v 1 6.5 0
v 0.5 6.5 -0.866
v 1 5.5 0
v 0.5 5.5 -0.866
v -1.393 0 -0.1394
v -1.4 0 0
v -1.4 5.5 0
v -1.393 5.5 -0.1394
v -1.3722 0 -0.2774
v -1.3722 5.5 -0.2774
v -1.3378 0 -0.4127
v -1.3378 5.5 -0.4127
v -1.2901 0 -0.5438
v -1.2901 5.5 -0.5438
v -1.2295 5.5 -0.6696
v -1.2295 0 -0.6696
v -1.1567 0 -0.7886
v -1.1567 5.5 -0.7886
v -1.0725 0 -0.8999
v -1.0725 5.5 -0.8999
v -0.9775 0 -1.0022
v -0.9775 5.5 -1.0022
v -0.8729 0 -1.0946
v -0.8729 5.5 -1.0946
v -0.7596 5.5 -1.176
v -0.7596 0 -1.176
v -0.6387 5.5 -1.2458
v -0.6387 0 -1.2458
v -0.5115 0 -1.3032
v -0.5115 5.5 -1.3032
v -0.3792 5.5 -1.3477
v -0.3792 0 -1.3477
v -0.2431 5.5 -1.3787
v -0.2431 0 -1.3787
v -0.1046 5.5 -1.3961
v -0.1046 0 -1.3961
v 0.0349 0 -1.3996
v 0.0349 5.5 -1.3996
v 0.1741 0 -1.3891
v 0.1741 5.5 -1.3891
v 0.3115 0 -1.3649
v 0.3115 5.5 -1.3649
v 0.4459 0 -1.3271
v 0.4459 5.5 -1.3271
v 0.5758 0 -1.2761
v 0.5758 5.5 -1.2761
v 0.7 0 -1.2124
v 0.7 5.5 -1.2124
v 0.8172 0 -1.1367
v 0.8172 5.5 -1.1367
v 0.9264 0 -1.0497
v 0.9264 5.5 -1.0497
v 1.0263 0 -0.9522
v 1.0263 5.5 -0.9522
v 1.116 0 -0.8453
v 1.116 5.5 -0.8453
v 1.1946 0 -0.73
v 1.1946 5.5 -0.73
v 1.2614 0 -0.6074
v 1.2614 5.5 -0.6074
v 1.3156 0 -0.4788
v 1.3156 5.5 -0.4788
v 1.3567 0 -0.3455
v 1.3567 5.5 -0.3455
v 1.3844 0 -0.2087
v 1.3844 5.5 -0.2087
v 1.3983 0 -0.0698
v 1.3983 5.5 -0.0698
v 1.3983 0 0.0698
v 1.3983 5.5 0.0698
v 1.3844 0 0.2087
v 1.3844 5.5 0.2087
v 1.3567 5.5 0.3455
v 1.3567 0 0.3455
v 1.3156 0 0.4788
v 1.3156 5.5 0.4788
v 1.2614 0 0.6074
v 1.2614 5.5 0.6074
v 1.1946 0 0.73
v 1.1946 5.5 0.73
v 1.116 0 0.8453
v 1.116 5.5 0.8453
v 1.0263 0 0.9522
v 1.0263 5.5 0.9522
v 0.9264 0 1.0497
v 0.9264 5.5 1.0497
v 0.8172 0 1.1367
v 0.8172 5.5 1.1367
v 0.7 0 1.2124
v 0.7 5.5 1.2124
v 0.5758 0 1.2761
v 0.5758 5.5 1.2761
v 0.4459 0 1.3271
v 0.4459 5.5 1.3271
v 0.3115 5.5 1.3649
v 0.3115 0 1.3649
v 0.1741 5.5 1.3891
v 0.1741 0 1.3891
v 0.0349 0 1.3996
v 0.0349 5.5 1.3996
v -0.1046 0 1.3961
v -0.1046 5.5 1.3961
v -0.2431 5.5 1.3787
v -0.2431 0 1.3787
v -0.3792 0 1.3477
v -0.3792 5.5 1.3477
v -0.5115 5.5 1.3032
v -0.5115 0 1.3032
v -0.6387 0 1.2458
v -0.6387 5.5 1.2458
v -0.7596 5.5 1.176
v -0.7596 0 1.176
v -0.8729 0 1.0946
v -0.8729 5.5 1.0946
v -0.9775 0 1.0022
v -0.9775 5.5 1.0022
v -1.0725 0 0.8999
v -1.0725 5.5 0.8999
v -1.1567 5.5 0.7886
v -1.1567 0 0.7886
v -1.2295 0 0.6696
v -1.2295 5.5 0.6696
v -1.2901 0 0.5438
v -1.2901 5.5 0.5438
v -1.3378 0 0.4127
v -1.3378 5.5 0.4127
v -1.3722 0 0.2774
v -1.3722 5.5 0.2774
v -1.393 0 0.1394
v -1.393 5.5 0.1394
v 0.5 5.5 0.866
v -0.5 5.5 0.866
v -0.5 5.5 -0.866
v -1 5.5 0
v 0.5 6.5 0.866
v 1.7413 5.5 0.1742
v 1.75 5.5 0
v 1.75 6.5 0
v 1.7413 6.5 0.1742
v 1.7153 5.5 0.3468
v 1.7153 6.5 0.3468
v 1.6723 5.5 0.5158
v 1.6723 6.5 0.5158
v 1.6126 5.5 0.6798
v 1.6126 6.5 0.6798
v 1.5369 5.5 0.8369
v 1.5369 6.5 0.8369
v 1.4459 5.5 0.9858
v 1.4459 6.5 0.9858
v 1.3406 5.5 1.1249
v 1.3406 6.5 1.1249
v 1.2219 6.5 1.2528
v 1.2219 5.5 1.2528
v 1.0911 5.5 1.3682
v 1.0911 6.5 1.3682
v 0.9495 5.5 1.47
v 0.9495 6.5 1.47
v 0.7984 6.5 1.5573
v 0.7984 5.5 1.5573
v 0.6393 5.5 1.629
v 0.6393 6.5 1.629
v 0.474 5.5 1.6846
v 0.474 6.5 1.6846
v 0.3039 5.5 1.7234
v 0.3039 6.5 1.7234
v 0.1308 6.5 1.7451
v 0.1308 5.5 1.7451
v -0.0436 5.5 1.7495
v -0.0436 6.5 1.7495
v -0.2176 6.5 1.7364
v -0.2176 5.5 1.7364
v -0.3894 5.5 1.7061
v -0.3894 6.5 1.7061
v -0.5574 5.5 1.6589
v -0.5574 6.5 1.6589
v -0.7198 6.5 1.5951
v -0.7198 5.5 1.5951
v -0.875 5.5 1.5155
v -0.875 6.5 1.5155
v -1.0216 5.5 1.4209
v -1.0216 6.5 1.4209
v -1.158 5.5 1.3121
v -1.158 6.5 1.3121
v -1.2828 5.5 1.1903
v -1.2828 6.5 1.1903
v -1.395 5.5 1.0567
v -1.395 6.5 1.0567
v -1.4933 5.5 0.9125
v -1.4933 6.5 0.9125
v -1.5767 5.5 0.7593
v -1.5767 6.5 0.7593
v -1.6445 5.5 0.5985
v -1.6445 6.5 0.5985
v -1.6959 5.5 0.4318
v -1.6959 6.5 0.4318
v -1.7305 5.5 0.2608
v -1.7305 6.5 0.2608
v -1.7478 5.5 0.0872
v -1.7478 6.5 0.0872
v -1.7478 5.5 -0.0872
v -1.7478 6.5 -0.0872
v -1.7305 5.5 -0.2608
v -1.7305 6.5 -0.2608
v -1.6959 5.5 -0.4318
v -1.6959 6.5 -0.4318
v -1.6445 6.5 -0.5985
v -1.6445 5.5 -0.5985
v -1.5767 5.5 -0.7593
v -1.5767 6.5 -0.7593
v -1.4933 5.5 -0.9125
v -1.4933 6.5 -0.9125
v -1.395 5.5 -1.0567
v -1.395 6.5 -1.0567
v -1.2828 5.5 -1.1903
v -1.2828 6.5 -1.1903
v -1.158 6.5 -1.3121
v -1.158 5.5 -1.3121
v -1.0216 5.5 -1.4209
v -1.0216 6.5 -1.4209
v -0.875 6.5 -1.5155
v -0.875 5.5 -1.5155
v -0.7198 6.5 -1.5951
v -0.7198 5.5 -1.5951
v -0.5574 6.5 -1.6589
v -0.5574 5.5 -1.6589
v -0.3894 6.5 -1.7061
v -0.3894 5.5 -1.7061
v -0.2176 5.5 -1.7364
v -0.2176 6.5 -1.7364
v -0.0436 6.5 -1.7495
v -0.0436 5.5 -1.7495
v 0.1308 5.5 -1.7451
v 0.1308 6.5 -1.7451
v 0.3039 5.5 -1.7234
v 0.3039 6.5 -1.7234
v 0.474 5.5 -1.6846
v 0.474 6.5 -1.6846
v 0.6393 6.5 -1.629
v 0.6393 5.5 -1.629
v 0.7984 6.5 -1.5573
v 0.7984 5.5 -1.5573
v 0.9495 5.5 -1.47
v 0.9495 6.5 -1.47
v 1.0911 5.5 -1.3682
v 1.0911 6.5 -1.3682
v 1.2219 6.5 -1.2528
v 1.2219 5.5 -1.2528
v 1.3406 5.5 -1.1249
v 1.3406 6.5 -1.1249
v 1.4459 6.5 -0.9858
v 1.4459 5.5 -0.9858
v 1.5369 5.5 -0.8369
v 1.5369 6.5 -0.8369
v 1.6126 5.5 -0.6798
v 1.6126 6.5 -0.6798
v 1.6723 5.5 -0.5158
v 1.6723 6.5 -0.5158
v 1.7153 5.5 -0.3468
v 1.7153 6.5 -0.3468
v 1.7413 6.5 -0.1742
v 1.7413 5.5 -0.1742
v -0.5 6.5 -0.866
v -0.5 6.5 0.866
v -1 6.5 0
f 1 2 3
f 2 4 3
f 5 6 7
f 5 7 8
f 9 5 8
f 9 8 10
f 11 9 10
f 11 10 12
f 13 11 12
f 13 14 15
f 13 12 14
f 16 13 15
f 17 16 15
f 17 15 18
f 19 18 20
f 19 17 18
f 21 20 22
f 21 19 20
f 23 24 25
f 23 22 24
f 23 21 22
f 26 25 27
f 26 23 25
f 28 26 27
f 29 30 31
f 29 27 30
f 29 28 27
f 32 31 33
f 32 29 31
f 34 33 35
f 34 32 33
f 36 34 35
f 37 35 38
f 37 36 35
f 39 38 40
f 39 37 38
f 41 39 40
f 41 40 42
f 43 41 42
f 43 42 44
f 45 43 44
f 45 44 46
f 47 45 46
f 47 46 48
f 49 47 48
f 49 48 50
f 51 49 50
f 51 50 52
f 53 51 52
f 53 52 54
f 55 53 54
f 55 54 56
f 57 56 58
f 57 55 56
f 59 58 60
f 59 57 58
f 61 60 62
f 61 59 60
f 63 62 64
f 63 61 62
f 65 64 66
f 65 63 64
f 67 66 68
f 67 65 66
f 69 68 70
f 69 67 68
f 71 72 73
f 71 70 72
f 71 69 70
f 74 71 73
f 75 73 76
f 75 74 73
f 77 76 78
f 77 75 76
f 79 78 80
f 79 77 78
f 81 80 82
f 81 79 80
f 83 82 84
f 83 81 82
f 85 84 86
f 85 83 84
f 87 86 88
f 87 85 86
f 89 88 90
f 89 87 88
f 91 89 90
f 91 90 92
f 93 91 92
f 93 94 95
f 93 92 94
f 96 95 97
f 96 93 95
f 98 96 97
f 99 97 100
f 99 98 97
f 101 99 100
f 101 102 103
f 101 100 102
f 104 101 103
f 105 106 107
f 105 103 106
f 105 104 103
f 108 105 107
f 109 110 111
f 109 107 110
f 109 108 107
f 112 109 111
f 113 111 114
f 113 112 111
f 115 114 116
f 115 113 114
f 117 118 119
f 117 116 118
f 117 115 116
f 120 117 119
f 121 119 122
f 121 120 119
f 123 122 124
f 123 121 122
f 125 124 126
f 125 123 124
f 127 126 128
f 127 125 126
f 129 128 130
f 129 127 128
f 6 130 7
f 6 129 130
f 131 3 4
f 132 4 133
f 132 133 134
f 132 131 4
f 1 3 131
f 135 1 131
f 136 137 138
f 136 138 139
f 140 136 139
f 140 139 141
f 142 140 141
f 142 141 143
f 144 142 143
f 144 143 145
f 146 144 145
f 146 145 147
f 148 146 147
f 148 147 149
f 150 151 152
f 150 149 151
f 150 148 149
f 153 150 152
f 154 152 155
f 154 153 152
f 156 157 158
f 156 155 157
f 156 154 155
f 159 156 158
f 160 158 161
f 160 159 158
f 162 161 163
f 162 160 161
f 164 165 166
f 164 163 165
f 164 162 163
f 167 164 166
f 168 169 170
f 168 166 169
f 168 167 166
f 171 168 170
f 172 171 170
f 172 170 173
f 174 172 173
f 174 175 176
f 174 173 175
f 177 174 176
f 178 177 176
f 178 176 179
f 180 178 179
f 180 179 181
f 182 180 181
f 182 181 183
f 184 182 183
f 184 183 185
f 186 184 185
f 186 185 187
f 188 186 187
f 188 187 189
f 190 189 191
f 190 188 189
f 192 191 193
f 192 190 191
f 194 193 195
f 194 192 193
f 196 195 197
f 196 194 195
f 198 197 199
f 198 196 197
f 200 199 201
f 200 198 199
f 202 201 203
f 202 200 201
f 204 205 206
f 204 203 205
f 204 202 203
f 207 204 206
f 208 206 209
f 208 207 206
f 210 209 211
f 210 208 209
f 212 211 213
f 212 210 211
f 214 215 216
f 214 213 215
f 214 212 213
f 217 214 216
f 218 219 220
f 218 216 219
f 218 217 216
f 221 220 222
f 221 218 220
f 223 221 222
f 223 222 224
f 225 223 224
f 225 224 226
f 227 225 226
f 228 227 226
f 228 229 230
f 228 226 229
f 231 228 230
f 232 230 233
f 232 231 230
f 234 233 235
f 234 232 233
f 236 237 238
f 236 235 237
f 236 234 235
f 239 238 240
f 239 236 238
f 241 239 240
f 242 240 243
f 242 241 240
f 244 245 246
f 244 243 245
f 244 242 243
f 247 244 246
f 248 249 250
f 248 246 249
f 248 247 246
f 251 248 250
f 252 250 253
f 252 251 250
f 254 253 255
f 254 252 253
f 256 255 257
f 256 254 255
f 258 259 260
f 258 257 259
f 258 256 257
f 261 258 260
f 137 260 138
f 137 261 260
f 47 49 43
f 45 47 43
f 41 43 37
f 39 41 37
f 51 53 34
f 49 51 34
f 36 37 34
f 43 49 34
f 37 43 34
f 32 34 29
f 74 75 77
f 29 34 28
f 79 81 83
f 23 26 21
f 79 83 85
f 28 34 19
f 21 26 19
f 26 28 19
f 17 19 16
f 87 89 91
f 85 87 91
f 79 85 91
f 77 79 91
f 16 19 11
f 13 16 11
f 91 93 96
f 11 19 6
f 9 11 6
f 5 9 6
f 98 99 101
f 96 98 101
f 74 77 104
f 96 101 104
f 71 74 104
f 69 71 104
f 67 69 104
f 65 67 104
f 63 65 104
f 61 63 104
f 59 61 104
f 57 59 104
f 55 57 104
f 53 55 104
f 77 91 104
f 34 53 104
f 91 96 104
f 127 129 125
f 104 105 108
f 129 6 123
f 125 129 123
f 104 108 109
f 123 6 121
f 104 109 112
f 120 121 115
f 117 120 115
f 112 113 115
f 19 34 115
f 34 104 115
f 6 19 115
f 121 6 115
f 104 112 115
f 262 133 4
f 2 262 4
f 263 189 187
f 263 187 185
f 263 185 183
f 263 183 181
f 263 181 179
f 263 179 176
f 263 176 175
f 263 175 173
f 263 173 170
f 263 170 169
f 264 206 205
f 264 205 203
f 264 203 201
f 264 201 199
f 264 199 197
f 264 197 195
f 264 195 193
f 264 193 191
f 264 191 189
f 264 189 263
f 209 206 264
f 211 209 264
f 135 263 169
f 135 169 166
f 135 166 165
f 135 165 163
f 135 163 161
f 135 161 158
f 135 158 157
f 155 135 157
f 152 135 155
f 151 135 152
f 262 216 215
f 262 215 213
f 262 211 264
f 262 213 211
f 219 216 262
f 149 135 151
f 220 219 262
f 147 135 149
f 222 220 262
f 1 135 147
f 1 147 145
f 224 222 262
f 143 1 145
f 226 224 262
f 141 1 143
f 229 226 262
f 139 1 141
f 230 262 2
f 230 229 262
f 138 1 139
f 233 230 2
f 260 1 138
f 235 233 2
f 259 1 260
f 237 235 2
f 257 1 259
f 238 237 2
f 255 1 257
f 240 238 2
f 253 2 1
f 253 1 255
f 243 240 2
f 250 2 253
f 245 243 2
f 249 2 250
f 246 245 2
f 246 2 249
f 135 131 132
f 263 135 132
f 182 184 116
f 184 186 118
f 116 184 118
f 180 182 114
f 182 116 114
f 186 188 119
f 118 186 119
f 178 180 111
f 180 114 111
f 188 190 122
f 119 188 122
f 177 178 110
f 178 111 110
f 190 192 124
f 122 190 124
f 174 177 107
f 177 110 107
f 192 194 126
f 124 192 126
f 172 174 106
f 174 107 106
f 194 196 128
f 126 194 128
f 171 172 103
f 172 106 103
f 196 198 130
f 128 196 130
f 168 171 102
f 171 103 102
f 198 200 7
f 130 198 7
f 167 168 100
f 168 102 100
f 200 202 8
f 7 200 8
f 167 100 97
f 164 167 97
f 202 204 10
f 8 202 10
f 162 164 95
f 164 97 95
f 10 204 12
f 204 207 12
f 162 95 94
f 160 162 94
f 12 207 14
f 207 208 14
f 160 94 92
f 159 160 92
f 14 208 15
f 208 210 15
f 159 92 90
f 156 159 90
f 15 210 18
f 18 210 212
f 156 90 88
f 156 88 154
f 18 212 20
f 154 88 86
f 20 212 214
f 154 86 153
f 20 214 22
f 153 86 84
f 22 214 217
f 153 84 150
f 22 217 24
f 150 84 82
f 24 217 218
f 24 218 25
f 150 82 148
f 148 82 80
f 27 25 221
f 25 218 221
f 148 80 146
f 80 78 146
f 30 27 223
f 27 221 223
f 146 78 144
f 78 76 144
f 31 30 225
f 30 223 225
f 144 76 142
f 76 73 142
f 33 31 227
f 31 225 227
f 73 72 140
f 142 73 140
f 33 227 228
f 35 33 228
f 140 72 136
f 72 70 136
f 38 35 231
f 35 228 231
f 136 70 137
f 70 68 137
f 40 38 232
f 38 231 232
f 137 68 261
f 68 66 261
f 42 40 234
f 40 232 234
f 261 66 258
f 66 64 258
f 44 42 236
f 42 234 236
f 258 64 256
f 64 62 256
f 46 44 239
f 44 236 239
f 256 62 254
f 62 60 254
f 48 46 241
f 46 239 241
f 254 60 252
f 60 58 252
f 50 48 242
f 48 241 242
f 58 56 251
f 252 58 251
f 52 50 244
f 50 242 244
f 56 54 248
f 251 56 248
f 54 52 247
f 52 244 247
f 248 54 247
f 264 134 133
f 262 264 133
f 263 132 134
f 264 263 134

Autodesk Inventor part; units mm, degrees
ref_plane "YZ Plane" through (0, 0, 0) normal (1, 0, 0) x (0, 1, 0)
ref_plane "XZ Plane" through (0, 0, 0) normal (0, 1, 0) x (-1, 0, 0)
ref_plane "XY Plane" through (0, 0, 0) normal (0, 0, 1) x (1, 0, 0)
sketch "Sketch1" plane through (0, 0, 0) normal (0, 1, 0) x (-1, 0, 0)
  circle A0 centre (0, 0) radius 1.4
  dimension "d0" = 2.8
extrude "Extrusion1" add sketch "Sketch1" along normal blind 5.5
sketch "Sketch2" plane through (0, 5.5, 0) normal (0, 1, 0) x (1, 0, 0)
  circle A0 centre (0, 0) radius 1.75
  line L0 (0, 0) -> (-1, 0)
  line L1 (-1, 0) -> (-0.5, 0.866)
  line L2 (-0.5, 0.866) -> (0.5, 0.866)
  line L3 (0.5, 0.866) -> (1, 0)
  line L4 (1, 0) -> (0.5, -0.866)
  line L5 (0.5, -0.866) -> (-0.5, -0.866)
  line L6 (-0.5, -0.866) -> (-1, 0)
  dimension "d3" = 3.5
  dimension "d4" = 1
extrude "Extrusion2" add sketch "Sketch2" along normal blind 1
thread "Thread1" size "M3x0.5" class "6g" standard "ANSI Metric M Profile" length 6
properties part number "Connector_3" material "Steel, Mild"
